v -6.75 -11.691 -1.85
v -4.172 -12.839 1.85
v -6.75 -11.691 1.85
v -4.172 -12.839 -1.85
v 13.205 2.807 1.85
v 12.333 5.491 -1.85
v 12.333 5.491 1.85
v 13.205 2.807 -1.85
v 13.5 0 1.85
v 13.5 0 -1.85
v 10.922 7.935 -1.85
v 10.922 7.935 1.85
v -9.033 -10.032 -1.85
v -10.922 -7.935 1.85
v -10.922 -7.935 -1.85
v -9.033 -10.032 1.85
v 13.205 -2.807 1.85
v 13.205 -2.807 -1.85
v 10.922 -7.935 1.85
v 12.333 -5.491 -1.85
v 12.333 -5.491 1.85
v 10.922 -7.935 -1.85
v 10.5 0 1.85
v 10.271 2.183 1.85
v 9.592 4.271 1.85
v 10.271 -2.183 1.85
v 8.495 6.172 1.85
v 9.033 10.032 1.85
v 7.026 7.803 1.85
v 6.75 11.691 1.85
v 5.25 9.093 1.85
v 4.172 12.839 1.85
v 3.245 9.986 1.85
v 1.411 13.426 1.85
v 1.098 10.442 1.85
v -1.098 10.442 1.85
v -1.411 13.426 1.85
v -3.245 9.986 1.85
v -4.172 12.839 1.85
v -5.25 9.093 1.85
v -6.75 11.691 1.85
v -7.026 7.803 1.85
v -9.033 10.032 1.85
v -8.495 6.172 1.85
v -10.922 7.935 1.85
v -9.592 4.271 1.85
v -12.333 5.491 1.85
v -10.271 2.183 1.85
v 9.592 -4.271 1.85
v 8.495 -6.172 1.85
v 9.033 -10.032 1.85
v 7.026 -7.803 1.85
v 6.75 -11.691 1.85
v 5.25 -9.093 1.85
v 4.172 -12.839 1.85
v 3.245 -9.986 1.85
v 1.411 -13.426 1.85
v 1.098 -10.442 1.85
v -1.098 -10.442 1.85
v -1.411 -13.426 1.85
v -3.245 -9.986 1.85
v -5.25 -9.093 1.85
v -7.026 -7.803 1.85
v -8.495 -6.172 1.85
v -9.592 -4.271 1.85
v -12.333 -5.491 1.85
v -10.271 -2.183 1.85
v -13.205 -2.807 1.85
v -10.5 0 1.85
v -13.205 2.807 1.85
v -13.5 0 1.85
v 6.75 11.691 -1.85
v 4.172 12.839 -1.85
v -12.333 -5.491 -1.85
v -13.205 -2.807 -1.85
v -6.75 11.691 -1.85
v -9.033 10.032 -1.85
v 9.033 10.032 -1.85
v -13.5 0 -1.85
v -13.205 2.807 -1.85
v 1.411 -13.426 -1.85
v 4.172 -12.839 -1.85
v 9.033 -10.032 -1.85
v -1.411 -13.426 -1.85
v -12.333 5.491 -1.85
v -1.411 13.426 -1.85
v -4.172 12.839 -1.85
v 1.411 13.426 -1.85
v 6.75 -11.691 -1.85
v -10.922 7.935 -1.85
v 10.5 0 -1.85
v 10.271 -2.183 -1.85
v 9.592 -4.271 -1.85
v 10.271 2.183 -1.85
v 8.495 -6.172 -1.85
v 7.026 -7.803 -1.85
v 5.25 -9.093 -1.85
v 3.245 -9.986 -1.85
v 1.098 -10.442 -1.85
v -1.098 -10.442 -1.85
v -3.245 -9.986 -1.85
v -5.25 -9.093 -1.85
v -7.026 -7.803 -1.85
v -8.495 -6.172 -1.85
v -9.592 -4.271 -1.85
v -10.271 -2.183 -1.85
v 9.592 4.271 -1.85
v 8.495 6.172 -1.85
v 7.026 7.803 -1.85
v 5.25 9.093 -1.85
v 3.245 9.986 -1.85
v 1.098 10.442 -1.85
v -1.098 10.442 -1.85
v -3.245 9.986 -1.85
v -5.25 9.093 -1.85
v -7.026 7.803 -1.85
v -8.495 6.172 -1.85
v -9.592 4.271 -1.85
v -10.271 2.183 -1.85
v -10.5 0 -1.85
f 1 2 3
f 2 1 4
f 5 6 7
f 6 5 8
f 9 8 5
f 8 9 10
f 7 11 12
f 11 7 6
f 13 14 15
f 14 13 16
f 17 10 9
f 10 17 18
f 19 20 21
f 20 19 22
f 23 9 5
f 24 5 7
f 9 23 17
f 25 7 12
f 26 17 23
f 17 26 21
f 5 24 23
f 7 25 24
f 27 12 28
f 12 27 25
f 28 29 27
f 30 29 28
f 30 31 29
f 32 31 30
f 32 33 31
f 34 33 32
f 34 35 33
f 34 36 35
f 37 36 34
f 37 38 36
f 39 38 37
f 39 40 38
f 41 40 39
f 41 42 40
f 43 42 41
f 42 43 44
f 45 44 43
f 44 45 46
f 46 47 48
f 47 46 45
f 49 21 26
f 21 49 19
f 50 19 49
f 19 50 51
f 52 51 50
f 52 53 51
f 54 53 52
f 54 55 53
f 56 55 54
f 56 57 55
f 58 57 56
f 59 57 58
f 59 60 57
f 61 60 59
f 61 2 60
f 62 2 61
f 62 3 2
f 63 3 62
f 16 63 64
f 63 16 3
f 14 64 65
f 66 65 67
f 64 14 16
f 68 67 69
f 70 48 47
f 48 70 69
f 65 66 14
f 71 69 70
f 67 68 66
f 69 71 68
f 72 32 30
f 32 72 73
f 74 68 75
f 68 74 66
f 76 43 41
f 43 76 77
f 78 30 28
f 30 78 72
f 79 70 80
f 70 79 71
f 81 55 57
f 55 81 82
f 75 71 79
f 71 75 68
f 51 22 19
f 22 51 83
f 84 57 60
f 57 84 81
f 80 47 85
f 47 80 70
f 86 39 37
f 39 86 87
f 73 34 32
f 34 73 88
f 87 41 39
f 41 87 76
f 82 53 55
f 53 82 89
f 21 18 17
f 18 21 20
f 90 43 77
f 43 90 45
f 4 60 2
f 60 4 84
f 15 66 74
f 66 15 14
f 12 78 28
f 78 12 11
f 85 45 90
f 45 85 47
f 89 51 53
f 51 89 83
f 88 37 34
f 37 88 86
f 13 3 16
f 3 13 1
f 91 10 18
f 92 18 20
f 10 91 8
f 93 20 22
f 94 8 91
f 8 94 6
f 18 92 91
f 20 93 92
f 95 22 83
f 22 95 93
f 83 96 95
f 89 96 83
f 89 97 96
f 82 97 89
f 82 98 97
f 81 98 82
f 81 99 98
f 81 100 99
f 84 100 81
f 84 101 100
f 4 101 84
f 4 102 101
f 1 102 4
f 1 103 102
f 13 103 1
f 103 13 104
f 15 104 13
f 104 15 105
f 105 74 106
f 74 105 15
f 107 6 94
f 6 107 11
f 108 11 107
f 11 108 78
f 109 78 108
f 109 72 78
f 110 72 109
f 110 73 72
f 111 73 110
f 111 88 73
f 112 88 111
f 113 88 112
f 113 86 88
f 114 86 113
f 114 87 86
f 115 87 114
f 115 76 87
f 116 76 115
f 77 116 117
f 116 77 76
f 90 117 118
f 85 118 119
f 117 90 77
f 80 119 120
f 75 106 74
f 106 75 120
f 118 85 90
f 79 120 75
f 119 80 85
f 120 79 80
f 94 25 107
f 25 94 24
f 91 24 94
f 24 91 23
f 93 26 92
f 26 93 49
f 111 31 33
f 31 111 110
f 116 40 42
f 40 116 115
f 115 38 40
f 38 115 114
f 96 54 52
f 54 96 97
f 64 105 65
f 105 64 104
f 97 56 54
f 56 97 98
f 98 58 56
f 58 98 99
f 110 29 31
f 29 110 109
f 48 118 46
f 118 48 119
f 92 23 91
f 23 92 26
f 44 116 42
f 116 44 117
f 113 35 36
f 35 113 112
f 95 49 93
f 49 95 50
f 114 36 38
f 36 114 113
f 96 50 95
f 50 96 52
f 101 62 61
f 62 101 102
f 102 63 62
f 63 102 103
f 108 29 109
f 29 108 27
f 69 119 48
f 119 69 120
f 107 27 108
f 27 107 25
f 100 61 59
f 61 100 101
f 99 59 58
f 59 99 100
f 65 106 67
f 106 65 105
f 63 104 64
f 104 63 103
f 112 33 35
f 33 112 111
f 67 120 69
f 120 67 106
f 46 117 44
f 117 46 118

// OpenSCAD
// Parameters
outer_radius = 13.5; //[6.75:27:0.1]
inner_radius = 10.5; //[5.25:21:0.1]
height = 3.7; //[1.85:7.4:0.1]
overlap = 1; //[0.5:2:0.1]

// Annular Ring Geometry
module annular_ring() {
  difference() {
    // Outer cylinder
    cylinder(r=outer_radius, h=height, center=true);
    
    // Inner cylinder (subtracting)
    cylinder(r=inner_radius, h=height + 2*overlap, center=true);
  }
}

// Render the annular ring
color("Silver") annular_ring();
